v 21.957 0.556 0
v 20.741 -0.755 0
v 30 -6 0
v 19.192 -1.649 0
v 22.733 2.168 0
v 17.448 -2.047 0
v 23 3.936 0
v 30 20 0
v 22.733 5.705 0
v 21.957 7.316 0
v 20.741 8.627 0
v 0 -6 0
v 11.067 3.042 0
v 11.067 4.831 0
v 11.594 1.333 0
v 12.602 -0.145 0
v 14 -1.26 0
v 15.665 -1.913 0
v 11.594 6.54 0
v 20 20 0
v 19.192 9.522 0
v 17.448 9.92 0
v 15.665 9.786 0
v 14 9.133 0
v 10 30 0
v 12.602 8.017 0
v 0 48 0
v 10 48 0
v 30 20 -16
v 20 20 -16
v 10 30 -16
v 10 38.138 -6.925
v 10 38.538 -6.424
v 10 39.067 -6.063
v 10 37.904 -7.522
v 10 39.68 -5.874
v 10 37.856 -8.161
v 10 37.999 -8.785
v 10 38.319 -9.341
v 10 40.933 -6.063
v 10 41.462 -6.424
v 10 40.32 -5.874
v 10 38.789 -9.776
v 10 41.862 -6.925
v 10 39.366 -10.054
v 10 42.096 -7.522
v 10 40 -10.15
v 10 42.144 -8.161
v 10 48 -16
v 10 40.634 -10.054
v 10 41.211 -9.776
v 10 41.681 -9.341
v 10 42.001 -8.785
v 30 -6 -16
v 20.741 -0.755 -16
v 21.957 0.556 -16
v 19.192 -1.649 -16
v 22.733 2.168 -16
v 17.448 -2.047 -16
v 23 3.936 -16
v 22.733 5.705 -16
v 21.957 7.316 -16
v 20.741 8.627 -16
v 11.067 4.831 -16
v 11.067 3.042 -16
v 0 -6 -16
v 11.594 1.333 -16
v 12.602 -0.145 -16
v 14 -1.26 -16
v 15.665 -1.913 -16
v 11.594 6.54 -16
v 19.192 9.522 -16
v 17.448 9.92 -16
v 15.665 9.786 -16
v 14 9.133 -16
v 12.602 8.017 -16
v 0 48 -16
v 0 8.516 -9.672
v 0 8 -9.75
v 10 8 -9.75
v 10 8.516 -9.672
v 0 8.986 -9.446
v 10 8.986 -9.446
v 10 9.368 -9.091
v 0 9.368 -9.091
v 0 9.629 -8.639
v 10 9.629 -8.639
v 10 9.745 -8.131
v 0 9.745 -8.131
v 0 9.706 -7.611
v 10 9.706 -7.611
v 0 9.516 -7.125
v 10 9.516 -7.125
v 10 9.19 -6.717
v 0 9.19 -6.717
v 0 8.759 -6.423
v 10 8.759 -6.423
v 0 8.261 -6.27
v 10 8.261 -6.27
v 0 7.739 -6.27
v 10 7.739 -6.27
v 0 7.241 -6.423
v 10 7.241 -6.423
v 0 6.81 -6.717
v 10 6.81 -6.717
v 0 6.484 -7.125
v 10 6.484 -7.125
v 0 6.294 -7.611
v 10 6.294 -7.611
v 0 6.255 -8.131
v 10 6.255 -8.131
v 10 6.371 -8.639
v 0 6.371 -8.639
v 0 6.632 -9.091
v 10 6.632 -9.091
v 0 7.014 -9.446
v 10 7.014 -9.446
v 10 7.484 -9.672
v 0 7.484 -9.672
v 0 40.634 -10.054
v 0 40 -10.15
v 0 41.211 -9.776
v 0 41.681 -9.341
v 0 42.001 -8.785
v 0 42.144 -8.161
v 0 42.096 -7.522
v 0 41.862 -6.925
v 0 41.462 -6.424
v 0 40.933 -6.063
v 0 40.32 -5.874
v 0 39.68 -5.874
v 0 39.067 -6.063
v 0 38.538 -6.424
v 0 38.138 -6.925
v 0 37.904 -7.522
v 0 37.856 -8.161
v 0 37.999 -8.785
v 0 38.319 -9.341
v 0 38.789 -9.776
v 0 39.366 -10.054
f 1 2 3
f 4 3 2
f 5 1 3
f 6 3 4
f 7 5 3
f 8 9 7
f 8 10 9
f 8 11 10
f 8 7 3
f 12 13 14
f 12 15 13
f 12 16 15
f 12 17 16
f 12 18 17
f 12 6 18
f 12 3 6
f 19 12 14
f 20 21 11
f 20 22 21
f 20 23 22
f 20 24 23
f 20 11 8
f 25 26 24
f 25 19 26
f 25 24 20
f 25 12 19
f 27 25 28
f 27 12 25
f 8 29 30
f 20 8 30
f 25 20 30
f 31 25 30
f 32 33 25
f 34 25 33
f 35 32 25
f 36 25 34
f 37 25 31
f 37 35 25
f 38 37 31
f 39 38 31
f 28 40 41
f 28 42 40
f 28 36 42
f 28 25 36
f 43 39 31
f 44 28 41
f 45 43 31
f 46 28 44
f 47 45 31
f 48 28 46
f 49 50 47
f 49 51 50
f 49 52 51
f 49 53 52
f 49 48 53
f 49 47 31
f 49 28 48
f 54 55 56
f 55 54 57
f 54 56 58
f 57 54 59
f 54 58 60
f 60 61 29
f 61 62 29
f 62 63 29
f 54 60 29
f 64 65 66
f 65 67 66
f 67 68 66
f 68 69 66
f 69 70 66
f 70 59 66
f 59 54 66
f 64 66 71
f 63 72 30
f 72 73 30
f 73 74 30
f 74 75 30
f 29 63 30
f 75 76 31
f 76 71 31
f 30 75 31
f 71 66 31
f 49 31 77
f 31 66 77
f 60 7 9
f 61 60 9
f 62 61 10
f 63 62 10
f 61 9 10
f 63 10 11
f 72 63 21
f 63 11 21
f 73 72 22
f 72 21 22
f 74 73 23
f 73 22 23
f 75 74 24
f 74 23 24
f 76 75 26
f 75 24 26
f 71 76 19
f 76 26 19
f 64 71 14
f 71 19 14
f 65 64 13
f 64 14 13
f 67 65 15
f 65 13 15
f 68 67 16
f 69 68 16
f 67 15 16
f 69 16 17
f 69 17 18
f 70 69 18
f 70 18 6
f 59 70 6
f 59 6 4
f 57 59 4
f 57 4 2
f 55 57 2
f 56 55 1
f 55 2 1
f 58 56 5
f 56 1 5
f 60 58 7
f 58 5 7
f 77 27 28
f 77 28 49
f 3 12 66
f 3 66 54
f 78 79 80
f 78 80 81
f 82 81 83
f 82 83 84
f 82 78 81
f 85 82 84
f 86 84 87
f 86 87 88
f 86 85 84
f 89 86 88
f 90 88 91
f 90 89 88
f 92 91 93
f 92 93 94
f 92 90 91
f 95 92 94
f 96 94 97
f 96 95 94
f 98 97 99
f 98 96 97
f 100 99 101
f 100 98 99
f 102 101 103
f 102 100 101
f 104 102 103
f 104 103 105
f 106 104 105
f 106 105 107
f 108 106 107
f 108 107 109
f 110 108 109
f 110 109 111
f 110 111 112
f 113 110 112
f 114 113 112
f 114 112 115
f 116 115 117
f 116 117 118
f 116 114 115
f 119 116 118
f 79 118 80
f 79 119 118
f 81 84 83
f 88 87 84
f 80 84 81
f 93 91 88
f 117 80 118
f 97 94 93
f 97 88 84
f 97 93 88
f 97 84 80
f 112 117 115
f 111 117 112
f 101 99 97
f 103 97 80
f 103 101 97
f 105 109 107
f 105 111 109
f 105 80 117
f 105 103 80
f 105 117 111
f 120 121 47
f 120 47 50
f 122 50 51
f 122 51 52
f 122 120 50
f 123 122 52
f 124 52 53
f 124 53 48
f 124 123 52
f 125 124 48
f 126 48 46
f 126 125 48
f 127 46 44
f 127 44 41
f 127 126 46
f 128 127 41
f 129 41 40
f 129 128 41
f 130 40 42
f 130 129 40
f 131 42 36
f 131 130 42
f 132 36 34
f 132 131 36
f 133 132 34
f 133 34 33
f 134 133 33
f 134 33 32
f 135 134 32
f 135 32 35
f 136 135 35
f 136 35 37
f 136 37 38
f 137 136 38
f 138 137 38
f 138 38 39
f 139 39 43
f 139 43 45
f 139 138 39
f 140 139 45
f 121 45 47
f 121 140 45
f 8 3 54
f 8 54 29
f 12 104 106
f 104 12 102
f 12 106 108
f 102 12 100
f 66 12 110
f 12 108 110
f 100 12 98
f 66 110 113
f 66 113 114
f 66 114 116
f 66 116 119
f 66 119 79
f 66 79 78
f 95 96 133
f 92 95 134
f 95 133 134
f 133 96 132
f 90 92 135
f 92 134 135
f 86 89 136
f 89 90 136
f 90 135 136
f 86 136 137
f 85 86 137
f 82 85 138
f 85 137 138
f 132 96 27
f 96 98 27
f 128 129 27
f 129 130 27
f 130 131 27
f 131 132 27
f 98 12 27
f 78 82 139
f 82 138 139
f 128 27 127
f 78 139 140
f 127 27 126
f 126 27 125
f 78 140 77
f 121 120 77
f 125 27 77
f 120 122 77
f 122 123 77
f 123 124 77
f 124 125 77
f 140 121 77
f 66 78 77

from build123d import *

# Parameters (mm, degrees)
SKETCH1_W           = 16
SKETCH1_H           = 48
SKETCH1_R           = 2.15
SKETCH1_R_2         = 1.75
BOSS_EXTRUDE1_DEPTH = 10
SKETCH2_R           = 6
BOSS_EXTRUDE2_DEPTH = 16
CHAMFER1_SIZE       = 10


with BuildPart() as part:
    # Sketch1 → Boss-Extrude1 (new body)
    with BuildSketch(Plane(origin=(0, 0, 0), x_dir=(0, 0, -1), z_dir=(1, 0, 0))):
        with Locations((8, 24)):
            Rectangle(SKETCH1_W, SKETCH1_H)
        with Locations((8, 40)):
            Circle(SKETCH1_R, mode=Mode.SUBTRACT)
        with Locations((8, 8)):
            Circle(SKETCH1_R_2, mode=Mode.SUBTRACT)
    extrude(amount=BOSS_EXTRUDE1_DEPTH)

    # Sketch2 → Boss-Extrude2 (add, through all)
    with BuildSketch(Plane.XY):
        Polygon((10, 20), (10, 0), (0, 0), (0, -6), (30, -6), (30, 20), align=None)
        with Locations((17, 3.936401072)):
            Circle(SKETCH2_R, mode=Mode.SUBTRACT)
    extrude(amount=-BOSS_EXTRUDE2_DEPTH)

    # Chamfer1
    chamfer1_edges = [part.edges().sort_by_distance(p)[0] for p in [
        (10, 20, -8),
    ]]
    chamfer(chamfer1_edges, length=CHAMFER1_SIZE)


solid = part.part
